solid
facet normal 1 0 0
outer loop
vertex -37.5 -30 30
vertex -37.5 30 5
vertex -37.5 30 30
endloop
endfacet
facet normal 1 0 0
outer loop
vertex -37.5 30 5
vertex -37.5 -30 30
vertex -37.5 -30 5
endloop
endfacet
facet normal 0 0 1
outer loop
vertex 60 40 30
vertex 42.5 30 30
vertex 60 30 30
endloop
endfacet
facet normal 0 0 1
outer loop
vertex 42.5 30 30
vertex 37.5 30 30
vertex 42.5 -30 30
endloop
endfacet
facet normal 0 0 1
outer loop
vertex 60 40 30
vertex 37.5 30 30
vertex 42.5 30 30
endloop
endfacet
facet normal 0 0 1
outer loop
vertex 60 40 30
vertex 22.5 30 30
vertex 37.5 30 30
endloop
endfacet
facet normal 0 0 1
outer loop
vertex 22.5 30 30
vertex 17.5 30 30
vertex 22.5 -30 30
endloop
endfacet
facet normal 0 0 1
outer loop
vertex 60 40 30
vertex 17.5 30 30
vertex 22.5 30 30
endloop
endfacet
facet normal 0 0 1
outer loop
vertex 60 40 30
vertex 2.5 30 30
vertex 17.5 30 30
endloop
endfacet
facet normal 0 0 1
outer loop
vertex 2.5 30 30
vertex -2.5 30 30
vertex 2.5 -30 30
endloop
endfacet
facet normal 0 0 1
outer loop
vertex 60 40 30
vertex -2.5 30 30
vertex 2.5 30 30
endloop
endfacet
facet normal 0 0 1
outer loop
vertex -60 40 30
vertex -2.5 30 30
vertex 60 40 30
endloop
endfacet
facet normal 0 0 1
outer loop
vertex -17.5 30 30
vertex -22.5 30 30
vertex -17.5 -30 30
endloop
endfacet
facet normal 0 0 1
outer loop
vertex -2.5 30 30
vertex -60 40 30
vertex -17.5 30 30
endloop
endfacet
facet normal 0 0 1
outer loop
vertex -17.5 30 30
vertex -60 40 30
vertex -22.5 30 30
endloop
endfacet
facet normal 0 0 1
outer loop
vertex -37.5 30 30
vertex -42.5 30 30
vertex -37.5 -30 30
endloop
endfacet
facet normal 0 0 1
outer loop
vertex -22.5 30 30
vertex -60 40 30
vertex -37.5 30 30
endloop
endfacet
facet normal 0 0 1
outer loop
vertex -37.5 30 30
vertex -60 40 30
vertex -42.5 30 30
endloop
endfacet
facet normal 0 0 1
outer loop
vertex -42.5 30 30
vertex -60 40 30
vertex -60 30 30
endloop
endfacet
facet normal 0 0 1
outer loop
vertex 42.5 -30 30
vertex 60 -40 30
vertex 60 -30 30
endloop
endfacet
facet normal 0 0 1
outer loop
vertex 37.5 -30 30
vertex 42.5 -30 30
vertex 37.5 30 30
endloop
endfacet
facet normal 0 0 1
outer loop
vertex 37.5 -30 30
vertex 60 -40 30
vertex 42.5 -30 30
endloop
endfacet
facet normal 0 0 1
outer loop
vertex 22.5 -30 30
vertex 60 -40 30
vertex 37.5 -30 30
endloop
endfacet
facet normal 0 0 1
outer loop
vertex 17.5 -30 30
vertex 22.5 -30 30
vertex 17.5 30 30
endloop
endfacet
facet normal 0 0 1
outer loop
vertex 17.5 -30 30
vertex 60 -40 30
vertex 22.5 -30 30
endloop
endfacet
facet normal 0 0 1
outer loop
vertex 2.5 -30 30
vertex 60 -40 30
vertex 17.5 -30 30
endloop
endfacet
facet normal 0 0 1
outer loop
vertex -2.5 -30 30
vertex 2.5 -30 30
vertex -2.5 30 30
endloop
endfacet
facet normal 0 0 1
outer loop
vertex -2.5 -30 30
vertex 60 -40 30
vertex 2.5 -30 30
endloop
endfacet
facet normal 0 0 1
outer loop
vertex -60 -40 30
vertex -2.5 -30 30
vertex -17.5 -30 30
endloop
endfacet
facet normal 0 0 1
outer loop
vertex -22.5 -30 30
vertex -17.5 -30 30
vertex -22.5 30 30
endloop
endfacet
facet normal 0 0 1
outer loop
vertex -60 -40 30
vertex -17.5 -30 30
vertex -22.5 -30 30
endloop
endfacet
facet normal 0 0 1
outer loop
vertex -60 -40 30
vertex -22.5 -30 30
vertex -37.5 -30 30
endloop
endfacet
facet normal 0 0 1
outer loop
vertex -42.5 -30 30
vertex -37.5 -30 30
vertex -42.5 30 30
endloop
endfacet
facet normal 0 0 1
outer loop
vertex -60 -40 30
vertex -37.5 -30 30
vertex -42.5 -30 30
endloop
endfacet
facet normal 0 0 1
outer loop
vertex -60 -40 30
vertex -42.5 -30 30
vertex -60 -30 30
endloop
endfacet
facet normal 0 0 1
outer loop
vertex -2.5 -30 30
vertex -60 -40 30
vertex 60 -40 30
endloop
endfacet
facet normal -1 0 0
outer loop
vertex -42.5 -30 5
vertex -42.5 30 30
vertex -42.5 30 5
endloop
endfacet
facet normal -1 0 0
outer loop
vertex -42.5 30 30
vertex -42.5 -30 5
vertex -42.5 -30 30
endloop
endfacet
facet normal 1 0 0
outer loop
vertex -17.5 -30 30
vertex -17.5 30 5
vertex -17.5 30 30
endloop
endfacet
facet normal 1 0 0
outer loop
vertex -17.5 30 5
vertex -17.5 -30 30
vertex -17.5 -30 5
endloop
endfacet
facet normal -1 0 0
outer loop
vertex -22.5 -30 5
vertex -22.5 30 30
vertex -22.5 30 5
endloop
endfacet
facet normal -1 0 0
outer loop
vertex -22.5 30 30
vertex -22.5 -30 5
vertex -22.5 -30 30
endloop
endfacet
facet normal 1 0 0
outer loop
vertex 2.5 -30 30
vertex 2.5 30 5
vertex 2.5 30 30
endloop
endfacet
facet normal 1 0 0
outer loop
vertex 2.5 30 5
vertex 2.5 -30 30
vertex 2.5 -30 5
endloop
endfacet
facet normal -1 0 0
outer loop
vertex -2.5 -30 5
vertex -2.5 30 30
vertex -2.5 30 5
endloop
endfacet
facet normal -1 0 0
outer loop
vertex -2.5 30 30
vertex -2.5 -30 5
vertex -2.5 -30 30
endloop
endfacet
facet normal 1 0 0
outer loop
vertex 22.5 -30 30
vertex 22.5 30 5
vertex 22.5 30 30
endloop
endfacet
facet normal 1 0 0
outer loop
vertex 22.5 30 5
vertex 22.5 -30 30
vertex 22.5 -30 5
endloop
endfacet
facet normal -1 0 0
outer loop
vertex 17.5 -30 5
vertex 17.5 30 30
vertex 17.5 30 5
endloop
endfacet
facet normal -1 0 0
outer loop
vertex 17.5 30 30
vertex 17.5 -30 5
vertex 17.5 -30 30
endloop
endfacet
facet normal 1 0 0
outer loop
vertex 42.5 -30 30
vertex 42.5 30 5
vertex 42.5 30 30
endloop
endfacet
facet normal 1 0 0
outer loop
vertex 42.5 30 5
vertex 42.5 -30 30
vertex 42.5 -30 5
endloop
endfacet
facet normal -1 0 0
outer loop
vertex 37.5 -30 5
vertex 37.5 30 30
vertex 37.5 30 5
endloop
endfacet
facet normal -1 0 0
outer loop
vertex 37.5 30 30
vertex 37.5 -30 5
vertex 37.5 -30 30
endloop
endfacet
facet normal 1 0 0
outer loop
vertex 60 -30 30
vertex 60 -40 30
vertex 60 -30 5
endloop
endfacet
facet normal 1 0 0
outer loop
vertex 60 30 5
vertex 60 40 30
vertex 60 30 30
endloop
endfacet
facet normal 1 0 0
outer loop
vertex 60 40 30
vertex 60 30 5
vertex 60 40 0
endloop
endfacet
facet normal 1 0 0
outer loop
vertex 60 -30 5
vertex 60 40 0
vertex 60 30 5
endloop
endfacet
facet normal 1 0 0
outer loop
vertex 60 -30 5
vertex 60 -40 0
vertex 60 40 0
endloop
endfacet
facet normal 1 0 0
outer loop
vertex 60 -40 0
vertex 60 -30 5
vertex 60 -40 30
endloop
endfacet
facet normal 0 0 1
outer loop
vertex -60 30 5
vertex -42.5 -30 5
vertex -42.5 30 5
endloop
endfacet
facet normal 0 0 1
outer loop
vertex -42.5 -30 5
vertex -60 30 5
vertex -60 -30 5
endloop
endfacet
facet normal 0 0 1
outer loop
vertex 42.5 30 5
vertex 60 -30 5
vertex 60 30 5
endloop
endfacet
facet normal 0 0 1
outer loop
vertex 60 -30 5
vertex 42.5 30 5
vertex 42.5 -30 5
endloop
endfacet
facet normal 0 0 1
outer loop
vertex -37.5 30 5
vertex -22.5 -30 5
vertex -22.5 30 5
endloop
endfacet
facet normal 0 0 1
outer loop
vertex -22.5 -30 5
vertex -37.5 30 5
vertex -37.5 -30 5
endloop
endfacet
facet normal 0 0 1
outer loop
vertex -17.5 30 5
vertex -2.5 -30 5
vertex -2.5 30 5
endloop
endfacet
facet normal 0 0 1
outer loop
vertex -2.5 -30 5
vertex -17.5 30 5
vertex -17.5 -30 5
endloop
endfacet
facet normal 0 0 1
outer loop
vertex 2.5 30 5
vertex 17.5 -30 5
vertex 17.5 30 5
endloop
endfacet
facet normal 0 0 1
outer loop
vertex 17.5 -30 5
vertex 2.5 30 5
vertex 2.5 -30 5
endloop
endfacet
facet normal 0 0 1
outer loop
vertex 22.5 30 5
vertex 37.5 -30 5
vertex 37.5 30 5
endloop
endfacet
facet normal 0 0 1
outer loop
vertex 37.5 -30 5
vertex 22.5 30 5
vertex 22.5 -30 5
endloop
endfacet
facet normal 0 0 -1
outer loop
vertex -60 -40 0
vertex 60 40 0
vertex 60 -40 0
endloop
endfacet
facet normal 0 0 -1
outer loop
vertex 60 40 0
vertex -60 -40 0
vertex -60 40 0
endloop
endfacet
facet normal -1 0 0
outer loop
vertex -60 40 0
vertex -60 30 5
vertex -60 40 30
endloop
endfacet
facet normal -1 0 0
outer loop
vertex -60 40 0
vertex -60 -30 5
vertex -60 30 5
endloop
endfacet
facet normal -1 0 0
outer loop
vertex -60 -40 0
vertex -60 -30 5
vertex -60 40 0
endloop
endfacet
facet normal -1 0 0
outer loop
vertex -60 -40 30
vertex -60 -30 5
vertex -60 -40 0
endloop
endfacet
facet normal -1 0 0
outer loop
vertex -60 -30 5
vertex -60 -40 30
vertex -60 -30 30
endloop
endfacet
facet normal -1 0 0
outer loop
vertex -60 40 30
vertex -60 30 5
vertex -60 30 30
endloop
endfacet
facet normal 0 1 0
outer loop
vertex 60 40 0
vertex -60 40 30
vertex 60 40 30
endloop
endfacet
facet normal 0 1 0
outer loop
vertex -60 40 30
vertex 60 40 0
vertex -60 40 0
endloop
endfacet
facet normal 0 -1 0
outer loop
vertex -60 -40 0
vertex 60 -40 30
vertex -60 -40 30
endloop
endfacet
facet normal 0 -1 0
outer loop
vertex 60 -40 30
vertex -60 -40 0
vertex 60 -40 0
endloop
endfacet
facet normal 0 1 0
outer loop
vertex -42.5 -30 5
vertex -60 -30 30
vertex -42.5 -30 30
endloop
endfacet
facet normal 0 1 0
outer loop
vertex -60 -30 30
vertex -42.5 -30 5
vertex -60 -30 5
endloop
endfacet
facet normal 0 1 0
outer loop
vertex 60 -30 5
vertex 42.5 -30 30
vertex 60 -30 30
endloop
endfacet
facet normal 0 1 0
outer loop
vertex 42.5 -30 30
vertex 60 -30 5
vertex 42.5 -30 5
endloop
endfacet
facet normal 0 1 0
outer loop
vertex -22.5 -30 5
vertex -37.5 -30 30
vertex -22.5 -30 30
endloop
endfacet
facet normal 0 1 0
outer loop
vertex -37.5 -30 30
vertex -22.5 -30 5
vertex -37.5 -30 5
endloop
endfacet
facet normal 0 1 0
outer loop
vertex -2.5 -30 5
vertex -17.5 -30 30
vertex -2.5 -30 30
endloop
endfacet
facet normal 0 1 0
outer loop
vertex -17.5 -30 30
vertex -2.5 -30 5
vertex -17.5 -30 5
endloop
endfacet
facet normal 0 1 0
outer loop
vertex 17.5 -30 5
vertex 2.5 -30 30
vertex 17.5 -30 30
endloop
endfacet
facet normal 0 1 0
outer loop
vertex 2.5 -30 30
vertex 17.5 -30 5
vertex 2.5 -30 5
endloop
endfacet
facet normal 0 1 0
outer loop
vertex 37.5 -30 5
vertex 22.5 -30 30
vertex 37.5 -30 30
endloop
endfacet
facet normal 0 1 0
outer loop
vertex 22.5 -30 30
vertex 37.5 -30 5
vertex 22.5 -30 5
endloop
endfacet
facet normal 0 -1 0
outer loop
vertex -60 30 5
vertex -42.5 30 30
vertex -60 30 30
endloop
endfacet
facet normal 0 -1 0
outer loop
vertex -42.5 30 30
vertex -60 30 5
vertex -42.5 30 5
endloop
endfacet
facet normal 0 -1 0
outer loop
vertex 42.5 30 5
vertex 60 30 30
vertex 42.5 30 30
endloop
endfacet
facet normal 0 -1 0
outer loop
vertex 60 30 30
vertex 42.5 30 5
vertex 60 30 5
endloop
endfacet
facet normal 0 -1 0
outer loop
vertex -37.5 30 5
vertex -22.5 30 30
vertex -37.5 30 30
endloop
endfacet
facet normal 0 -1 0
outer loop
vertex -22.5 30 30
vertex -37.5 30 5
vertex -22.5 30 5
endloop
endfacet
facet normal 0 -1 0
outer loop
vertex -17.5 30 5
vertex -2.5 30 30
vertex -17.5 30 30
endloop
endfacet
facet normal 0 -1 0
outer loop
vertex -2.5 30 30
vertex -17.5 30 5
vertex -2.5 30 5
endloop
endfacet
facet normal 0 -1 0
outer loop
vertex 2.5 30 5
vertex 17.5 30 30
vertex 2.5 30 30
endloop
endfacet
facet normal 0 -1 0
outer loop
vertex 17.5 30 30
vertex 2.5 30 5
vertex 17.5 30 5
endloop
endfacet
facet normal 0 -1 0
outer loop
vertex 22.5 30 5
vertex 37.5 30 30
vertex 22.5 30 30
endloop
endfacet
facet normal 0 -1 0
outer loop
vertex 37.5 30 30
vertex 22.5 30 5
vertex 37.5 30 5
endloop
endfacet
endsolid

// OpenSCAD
$fn = 32;

// ----------------------------------------------------------------------
// Rib frame 120 x 80 x 30
// 5 ribs at 20 mm pitch
// ----------------------------------------------------------------------

// --- parameters (mm) ---
frame = [120, 80, 5];  // base plate size (x, y, z)
seat_tol = 0.1;        // tolerance at the seating features
free_tol = 0.5;        // general tolerance on the free sizes
rail_w = 10;           // side rail width
ribs = 5;              // number of ribs
rib_t = 5;             // rib thickness
rib_h = 25;            // rib height above the base plate
pitch = 20;            // pitch between rib centres

// --- derived feature positions (mm) ---
span = (ribs - 1) * pitch;          // = 80   distance between the outer ribs
origin_x = -span / 2;               // = -40   X of the first rib
rib_len = frame[1] - 2 * rail_w + 2;  // = 62   rib length, 1 mm into each rail
feature_centers = [
  [origin_x + 0 * pitch, 0],
  [origin_x + 1 * pitch, 0],
  [origin_x + 2 * pitch, 0],
  [origin_x + 3 * pitch, 0],
  [origin_x + 4 * pitch, 0]
];   // rib centre line, drives the rib loop

// base plate, two side rails, then the ribs read straight off feature_centers
union() {
  translate([-frame[0] / 2, -frame[1] / 2, 0]) cube(frame);
  translate([-frame[0] / 2, -frame[1] / 2, 0]) cube([frame[0], rail_w, frame[2] + rib_h]);
  translate([-frame[0] / 2, frame[1] / 2 - rail_w, 0]) cube([frame[0], rail_w, frame[2] + rib_h]);
  for (centre = feature_centers)
    translate([centre[0] - rib_t / 2, centre[1] - rib_len / 2, frame[2] - 1])
      cube([rib_t, rib_len, rib_h + 1]);
}
